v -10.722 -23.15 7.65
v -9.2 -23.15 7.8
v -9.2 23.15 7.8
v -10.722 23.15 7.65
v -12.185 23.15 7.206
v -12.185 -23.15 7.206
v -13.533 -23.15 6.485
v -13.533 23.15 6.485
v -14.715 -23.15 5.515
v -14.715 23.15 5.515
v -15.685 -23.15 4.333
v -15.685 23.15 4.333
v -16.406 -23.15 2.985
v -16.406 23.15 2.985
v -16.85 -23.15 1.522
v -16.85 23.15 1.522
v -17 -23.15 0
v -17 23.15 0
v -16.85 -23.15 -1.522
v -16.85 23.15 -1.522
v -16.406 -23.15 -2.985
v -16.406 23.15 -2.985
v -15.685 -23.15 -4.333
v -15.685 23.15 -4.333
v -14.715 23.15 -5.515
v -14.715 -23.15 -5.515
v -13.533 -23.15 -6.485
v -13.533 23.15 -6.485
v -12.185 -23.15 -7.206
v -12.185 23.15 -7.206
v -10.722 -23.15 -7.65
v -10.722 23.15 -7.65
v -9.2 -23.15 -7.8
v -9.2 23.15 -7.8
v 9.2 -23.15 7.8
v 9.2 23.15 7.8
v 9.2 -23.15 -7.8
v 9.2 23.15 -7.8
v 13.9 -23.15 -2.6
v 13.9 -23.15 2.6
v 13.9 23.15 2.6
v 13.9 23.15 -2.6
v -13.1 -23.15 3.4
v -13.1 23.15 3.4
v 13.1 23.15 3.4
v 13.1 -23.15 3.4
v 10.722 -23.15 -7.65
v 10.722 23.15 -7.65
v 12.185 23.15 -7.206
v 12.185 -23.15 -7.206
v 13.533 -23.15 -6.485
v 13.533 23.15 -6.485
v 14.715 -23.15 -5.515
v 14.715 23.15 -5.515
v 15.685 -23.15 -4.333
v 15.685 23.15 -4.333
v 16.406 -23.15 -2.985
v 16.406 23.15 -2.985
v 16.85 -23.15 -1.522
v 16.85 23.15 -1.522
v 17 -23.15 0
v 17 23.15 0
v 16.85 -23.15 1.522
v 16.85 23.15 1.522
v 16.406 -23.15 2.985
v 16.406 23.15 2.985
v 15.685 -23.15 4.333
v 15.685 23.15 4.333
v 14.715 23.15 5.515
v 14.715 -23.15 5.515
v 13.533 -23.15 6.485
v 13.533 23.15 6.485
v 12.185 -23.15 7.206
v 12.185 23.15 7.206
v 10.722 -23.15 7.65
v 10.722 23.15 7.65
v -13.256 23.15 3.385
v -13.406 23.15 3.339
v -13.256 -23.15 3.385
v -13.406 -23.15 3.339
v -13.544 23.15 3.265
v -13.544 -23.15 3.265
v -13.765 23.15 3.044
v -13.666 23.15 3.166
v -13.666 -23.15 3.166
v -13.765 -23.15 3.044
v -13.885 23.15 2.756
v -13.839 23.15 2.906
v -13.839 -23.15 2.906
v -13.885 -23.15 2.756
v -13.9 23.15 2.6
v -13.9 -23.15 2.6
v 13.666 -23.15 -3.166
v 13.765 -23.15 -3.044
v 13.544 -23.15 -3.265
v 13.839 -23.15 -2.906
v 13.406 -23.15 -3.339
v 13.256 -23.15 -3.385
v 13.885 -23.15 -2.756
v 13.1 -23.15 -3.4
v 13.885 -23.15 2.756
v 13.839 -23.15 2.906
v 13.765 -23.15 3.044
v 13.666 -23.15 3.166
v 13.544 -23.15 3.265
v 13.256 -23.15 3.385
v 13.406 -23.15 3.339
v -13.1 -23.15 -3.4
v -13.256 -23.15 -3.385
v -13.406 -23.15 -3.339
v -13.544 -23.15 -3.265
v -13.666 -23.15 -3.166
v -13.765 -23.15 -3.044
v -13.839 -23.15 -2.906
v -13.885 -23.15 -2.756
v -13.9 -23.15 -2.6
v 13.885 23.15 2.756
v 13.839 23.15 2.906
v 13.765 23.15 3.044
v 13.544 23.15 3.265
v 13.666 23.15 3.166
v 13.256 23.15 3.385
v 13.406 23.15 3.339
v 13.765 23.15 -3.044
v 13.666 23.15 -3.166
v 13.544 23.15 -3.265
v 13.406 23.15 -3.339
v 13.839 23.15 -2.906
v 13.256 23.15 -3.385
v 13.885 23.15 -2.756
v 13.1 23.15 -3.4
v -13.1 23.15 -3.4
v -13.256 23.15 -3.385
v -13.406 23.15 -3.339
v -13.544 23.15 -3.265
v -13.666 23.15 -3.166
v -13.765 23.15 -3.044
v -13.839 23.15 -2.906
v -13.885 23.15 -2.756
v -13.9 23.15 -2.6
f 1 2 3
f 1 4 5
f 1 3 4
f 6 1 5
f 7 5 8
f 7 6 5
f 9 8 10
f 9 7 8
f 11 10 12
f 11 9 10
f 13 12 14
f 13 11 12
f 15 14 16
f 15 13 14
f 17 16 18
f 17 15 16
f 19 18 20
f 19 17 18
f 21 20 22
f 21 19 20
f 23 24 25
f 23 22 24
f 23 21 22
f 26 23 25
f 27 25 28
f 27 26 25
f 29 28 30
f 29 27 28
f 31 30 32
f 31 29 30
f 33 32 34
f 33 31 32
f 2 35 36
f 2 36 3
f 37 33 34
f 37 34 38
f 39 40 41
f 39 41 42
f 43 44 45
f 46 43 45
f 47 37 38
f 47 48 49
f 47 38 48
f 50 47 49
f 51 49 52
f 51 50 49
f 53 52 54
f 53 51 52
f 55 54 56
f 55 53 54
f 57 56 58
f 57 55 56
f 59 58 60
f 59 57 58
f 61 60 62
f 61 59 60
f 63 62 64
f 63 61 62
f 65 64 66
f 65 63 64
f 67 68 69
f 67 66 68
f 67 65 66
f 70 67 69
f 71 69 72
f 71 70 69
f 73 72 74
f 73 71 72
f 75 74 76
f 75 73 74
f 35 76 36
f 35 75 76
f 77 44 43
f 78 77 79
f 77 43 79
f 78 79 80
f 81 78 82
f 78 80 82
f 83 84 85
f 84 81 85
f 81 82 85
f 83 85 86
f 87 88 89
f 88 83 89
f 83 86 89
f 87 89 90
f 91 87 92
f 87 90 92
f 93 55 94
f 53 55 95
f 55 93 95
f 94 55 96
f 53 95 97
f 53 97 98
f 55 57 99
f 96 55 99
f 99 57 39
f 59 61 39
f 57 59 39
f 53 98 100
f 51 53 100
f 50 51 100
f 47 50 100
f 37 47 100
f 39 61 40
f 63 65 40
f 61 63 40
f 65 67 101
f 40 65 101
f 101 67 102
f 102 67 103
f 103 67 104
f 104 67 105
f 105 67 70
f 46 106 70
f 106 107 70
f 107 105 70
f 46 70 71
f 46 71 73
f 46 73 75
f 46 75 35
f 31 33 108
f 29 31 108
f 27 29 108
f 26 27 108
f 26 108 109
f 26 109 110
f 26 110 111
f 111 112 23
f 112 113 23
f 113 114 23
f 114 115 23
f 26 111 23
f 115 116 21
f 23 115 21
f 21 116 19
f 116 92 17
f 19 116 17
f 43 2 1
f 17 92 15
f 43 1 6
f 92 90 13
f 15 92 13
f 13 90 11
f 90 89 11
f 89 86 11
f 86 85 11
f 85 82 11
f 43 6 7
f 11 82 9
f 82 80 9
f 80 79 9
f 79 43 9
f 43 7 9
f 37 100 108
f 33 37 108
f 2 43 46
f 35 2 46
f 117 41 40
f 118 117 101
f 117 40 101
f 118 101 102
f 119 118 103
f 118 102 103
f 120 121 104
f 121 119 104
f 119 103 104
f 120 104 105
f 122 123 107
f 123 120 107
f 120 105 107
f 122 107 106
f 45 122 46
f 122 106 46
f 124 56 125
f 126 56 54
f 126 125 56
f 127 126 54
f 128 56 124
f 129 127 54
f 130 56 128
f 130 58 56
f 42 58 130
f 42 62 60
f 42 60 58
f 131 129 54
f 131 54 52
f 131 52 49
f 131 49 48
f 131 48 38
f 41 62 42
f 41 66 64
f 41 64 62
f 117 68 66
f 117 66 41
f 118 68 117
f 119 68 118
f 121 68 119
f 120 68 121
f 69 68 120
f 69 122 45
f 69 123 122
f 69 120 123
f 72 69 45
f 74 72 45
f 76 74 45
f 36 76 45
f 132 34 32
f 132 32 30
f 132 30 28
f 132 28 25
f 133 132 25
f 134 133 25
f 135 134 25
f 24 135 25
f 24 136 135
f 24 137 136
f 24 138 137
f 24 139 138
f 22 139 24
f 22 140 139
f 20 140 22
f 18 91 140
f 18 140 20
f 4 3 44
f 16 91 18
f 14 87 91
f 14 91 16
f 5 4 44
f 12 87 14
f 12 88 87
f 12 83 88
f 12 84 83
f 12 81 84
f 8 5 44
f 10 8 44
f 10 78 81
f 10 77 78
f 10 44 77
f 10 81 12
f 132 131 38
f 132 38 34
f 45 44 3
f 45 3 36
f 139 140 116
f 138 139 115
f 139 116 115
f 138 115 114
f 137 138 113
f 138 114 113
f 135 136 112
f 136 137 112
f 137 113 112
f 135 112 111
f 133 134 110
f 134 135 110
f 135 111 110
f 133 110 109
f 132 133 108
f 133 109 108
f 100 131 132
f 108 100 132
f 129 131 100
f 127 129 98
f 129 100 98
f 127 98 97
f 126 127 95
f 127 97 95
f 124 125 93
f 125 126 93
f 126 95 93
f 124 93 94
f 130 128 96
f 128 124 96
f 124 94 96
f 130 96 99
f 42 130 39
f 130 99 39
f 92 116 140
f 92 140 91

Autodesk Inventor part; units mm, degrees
ref_plane "YZ Plane" through (0, 0, 0) normal (1, 0, 0) x (0, 1, 0)
ref_plane "XZ Plane" through (0, 0, 0) normal (0, 1, 0) x (-1, 0, 0)
ref_plane "XY Plane" through (0, 0, 0) normal (0, 0, 1) x (1, 0, 0)
sketch "Skizze1" plane through (0, 0, 0) normal (0, 1, 0) x (-1, 0, 0)
  line L0 (13.1, 3.4) -> (-13.1, 3.4)
  line L1 (-13.9, 2.6) -> (-13.9, -2.6)
  line L2 (-13.1, -3.4) -> (13.1, -3.4)
  line L3 (13.9, -2.6) -> (13.9, 2.6)
  line L4 (13.9, 3.4) -> (-13.9, -3.4) construction
  line L5 (-13.9, 3.4) -> (13.9, -3.4) construction
  arc A0 (13.9, 2.6) -> (13.1, 3.4) centre (13.1, 2.6) ccw
  arc A1 (13.1, -3.4) -> (13.9, -2.6) centre (13.1, -2.6) ccw
  arc A2 (-13.9, -2.6) -> (-13.1, -3.4) centre (-13.1, -2.6) ccw
  arc A3 (-13.1, 3.4) -> (-13.9, 2.6) centre (-13.1, 2.6) ccw
  line L6 (9.2, 0) -> (-9.2, 0) construction
  line L7 (9.2, -7.8) -> (-9.2, -7.8)
  line L8 (-9.2, 7.8) -> (9.2, 7.8)
  arc A4 (9.2, -7.8) -> (9.2, 7.8) centre (9.2, 0) ccw
  arc A5 (-9.2, 7.8) -> (-9.2, -7.8) centre (-9.2, 0) ccw
  point P0 (0, 0)
  dimension "d0" = 27.8
  dimension "d1" = 6.8
  dimension "d2" = 0.8
  dimension "d6" = 4.4
  dimension "d7" = 34
extrude "Extrusion1" add sketch "Skizze1" along normal mid plane 46.3
properties part number "Kupferspule" material "Kupfer"
